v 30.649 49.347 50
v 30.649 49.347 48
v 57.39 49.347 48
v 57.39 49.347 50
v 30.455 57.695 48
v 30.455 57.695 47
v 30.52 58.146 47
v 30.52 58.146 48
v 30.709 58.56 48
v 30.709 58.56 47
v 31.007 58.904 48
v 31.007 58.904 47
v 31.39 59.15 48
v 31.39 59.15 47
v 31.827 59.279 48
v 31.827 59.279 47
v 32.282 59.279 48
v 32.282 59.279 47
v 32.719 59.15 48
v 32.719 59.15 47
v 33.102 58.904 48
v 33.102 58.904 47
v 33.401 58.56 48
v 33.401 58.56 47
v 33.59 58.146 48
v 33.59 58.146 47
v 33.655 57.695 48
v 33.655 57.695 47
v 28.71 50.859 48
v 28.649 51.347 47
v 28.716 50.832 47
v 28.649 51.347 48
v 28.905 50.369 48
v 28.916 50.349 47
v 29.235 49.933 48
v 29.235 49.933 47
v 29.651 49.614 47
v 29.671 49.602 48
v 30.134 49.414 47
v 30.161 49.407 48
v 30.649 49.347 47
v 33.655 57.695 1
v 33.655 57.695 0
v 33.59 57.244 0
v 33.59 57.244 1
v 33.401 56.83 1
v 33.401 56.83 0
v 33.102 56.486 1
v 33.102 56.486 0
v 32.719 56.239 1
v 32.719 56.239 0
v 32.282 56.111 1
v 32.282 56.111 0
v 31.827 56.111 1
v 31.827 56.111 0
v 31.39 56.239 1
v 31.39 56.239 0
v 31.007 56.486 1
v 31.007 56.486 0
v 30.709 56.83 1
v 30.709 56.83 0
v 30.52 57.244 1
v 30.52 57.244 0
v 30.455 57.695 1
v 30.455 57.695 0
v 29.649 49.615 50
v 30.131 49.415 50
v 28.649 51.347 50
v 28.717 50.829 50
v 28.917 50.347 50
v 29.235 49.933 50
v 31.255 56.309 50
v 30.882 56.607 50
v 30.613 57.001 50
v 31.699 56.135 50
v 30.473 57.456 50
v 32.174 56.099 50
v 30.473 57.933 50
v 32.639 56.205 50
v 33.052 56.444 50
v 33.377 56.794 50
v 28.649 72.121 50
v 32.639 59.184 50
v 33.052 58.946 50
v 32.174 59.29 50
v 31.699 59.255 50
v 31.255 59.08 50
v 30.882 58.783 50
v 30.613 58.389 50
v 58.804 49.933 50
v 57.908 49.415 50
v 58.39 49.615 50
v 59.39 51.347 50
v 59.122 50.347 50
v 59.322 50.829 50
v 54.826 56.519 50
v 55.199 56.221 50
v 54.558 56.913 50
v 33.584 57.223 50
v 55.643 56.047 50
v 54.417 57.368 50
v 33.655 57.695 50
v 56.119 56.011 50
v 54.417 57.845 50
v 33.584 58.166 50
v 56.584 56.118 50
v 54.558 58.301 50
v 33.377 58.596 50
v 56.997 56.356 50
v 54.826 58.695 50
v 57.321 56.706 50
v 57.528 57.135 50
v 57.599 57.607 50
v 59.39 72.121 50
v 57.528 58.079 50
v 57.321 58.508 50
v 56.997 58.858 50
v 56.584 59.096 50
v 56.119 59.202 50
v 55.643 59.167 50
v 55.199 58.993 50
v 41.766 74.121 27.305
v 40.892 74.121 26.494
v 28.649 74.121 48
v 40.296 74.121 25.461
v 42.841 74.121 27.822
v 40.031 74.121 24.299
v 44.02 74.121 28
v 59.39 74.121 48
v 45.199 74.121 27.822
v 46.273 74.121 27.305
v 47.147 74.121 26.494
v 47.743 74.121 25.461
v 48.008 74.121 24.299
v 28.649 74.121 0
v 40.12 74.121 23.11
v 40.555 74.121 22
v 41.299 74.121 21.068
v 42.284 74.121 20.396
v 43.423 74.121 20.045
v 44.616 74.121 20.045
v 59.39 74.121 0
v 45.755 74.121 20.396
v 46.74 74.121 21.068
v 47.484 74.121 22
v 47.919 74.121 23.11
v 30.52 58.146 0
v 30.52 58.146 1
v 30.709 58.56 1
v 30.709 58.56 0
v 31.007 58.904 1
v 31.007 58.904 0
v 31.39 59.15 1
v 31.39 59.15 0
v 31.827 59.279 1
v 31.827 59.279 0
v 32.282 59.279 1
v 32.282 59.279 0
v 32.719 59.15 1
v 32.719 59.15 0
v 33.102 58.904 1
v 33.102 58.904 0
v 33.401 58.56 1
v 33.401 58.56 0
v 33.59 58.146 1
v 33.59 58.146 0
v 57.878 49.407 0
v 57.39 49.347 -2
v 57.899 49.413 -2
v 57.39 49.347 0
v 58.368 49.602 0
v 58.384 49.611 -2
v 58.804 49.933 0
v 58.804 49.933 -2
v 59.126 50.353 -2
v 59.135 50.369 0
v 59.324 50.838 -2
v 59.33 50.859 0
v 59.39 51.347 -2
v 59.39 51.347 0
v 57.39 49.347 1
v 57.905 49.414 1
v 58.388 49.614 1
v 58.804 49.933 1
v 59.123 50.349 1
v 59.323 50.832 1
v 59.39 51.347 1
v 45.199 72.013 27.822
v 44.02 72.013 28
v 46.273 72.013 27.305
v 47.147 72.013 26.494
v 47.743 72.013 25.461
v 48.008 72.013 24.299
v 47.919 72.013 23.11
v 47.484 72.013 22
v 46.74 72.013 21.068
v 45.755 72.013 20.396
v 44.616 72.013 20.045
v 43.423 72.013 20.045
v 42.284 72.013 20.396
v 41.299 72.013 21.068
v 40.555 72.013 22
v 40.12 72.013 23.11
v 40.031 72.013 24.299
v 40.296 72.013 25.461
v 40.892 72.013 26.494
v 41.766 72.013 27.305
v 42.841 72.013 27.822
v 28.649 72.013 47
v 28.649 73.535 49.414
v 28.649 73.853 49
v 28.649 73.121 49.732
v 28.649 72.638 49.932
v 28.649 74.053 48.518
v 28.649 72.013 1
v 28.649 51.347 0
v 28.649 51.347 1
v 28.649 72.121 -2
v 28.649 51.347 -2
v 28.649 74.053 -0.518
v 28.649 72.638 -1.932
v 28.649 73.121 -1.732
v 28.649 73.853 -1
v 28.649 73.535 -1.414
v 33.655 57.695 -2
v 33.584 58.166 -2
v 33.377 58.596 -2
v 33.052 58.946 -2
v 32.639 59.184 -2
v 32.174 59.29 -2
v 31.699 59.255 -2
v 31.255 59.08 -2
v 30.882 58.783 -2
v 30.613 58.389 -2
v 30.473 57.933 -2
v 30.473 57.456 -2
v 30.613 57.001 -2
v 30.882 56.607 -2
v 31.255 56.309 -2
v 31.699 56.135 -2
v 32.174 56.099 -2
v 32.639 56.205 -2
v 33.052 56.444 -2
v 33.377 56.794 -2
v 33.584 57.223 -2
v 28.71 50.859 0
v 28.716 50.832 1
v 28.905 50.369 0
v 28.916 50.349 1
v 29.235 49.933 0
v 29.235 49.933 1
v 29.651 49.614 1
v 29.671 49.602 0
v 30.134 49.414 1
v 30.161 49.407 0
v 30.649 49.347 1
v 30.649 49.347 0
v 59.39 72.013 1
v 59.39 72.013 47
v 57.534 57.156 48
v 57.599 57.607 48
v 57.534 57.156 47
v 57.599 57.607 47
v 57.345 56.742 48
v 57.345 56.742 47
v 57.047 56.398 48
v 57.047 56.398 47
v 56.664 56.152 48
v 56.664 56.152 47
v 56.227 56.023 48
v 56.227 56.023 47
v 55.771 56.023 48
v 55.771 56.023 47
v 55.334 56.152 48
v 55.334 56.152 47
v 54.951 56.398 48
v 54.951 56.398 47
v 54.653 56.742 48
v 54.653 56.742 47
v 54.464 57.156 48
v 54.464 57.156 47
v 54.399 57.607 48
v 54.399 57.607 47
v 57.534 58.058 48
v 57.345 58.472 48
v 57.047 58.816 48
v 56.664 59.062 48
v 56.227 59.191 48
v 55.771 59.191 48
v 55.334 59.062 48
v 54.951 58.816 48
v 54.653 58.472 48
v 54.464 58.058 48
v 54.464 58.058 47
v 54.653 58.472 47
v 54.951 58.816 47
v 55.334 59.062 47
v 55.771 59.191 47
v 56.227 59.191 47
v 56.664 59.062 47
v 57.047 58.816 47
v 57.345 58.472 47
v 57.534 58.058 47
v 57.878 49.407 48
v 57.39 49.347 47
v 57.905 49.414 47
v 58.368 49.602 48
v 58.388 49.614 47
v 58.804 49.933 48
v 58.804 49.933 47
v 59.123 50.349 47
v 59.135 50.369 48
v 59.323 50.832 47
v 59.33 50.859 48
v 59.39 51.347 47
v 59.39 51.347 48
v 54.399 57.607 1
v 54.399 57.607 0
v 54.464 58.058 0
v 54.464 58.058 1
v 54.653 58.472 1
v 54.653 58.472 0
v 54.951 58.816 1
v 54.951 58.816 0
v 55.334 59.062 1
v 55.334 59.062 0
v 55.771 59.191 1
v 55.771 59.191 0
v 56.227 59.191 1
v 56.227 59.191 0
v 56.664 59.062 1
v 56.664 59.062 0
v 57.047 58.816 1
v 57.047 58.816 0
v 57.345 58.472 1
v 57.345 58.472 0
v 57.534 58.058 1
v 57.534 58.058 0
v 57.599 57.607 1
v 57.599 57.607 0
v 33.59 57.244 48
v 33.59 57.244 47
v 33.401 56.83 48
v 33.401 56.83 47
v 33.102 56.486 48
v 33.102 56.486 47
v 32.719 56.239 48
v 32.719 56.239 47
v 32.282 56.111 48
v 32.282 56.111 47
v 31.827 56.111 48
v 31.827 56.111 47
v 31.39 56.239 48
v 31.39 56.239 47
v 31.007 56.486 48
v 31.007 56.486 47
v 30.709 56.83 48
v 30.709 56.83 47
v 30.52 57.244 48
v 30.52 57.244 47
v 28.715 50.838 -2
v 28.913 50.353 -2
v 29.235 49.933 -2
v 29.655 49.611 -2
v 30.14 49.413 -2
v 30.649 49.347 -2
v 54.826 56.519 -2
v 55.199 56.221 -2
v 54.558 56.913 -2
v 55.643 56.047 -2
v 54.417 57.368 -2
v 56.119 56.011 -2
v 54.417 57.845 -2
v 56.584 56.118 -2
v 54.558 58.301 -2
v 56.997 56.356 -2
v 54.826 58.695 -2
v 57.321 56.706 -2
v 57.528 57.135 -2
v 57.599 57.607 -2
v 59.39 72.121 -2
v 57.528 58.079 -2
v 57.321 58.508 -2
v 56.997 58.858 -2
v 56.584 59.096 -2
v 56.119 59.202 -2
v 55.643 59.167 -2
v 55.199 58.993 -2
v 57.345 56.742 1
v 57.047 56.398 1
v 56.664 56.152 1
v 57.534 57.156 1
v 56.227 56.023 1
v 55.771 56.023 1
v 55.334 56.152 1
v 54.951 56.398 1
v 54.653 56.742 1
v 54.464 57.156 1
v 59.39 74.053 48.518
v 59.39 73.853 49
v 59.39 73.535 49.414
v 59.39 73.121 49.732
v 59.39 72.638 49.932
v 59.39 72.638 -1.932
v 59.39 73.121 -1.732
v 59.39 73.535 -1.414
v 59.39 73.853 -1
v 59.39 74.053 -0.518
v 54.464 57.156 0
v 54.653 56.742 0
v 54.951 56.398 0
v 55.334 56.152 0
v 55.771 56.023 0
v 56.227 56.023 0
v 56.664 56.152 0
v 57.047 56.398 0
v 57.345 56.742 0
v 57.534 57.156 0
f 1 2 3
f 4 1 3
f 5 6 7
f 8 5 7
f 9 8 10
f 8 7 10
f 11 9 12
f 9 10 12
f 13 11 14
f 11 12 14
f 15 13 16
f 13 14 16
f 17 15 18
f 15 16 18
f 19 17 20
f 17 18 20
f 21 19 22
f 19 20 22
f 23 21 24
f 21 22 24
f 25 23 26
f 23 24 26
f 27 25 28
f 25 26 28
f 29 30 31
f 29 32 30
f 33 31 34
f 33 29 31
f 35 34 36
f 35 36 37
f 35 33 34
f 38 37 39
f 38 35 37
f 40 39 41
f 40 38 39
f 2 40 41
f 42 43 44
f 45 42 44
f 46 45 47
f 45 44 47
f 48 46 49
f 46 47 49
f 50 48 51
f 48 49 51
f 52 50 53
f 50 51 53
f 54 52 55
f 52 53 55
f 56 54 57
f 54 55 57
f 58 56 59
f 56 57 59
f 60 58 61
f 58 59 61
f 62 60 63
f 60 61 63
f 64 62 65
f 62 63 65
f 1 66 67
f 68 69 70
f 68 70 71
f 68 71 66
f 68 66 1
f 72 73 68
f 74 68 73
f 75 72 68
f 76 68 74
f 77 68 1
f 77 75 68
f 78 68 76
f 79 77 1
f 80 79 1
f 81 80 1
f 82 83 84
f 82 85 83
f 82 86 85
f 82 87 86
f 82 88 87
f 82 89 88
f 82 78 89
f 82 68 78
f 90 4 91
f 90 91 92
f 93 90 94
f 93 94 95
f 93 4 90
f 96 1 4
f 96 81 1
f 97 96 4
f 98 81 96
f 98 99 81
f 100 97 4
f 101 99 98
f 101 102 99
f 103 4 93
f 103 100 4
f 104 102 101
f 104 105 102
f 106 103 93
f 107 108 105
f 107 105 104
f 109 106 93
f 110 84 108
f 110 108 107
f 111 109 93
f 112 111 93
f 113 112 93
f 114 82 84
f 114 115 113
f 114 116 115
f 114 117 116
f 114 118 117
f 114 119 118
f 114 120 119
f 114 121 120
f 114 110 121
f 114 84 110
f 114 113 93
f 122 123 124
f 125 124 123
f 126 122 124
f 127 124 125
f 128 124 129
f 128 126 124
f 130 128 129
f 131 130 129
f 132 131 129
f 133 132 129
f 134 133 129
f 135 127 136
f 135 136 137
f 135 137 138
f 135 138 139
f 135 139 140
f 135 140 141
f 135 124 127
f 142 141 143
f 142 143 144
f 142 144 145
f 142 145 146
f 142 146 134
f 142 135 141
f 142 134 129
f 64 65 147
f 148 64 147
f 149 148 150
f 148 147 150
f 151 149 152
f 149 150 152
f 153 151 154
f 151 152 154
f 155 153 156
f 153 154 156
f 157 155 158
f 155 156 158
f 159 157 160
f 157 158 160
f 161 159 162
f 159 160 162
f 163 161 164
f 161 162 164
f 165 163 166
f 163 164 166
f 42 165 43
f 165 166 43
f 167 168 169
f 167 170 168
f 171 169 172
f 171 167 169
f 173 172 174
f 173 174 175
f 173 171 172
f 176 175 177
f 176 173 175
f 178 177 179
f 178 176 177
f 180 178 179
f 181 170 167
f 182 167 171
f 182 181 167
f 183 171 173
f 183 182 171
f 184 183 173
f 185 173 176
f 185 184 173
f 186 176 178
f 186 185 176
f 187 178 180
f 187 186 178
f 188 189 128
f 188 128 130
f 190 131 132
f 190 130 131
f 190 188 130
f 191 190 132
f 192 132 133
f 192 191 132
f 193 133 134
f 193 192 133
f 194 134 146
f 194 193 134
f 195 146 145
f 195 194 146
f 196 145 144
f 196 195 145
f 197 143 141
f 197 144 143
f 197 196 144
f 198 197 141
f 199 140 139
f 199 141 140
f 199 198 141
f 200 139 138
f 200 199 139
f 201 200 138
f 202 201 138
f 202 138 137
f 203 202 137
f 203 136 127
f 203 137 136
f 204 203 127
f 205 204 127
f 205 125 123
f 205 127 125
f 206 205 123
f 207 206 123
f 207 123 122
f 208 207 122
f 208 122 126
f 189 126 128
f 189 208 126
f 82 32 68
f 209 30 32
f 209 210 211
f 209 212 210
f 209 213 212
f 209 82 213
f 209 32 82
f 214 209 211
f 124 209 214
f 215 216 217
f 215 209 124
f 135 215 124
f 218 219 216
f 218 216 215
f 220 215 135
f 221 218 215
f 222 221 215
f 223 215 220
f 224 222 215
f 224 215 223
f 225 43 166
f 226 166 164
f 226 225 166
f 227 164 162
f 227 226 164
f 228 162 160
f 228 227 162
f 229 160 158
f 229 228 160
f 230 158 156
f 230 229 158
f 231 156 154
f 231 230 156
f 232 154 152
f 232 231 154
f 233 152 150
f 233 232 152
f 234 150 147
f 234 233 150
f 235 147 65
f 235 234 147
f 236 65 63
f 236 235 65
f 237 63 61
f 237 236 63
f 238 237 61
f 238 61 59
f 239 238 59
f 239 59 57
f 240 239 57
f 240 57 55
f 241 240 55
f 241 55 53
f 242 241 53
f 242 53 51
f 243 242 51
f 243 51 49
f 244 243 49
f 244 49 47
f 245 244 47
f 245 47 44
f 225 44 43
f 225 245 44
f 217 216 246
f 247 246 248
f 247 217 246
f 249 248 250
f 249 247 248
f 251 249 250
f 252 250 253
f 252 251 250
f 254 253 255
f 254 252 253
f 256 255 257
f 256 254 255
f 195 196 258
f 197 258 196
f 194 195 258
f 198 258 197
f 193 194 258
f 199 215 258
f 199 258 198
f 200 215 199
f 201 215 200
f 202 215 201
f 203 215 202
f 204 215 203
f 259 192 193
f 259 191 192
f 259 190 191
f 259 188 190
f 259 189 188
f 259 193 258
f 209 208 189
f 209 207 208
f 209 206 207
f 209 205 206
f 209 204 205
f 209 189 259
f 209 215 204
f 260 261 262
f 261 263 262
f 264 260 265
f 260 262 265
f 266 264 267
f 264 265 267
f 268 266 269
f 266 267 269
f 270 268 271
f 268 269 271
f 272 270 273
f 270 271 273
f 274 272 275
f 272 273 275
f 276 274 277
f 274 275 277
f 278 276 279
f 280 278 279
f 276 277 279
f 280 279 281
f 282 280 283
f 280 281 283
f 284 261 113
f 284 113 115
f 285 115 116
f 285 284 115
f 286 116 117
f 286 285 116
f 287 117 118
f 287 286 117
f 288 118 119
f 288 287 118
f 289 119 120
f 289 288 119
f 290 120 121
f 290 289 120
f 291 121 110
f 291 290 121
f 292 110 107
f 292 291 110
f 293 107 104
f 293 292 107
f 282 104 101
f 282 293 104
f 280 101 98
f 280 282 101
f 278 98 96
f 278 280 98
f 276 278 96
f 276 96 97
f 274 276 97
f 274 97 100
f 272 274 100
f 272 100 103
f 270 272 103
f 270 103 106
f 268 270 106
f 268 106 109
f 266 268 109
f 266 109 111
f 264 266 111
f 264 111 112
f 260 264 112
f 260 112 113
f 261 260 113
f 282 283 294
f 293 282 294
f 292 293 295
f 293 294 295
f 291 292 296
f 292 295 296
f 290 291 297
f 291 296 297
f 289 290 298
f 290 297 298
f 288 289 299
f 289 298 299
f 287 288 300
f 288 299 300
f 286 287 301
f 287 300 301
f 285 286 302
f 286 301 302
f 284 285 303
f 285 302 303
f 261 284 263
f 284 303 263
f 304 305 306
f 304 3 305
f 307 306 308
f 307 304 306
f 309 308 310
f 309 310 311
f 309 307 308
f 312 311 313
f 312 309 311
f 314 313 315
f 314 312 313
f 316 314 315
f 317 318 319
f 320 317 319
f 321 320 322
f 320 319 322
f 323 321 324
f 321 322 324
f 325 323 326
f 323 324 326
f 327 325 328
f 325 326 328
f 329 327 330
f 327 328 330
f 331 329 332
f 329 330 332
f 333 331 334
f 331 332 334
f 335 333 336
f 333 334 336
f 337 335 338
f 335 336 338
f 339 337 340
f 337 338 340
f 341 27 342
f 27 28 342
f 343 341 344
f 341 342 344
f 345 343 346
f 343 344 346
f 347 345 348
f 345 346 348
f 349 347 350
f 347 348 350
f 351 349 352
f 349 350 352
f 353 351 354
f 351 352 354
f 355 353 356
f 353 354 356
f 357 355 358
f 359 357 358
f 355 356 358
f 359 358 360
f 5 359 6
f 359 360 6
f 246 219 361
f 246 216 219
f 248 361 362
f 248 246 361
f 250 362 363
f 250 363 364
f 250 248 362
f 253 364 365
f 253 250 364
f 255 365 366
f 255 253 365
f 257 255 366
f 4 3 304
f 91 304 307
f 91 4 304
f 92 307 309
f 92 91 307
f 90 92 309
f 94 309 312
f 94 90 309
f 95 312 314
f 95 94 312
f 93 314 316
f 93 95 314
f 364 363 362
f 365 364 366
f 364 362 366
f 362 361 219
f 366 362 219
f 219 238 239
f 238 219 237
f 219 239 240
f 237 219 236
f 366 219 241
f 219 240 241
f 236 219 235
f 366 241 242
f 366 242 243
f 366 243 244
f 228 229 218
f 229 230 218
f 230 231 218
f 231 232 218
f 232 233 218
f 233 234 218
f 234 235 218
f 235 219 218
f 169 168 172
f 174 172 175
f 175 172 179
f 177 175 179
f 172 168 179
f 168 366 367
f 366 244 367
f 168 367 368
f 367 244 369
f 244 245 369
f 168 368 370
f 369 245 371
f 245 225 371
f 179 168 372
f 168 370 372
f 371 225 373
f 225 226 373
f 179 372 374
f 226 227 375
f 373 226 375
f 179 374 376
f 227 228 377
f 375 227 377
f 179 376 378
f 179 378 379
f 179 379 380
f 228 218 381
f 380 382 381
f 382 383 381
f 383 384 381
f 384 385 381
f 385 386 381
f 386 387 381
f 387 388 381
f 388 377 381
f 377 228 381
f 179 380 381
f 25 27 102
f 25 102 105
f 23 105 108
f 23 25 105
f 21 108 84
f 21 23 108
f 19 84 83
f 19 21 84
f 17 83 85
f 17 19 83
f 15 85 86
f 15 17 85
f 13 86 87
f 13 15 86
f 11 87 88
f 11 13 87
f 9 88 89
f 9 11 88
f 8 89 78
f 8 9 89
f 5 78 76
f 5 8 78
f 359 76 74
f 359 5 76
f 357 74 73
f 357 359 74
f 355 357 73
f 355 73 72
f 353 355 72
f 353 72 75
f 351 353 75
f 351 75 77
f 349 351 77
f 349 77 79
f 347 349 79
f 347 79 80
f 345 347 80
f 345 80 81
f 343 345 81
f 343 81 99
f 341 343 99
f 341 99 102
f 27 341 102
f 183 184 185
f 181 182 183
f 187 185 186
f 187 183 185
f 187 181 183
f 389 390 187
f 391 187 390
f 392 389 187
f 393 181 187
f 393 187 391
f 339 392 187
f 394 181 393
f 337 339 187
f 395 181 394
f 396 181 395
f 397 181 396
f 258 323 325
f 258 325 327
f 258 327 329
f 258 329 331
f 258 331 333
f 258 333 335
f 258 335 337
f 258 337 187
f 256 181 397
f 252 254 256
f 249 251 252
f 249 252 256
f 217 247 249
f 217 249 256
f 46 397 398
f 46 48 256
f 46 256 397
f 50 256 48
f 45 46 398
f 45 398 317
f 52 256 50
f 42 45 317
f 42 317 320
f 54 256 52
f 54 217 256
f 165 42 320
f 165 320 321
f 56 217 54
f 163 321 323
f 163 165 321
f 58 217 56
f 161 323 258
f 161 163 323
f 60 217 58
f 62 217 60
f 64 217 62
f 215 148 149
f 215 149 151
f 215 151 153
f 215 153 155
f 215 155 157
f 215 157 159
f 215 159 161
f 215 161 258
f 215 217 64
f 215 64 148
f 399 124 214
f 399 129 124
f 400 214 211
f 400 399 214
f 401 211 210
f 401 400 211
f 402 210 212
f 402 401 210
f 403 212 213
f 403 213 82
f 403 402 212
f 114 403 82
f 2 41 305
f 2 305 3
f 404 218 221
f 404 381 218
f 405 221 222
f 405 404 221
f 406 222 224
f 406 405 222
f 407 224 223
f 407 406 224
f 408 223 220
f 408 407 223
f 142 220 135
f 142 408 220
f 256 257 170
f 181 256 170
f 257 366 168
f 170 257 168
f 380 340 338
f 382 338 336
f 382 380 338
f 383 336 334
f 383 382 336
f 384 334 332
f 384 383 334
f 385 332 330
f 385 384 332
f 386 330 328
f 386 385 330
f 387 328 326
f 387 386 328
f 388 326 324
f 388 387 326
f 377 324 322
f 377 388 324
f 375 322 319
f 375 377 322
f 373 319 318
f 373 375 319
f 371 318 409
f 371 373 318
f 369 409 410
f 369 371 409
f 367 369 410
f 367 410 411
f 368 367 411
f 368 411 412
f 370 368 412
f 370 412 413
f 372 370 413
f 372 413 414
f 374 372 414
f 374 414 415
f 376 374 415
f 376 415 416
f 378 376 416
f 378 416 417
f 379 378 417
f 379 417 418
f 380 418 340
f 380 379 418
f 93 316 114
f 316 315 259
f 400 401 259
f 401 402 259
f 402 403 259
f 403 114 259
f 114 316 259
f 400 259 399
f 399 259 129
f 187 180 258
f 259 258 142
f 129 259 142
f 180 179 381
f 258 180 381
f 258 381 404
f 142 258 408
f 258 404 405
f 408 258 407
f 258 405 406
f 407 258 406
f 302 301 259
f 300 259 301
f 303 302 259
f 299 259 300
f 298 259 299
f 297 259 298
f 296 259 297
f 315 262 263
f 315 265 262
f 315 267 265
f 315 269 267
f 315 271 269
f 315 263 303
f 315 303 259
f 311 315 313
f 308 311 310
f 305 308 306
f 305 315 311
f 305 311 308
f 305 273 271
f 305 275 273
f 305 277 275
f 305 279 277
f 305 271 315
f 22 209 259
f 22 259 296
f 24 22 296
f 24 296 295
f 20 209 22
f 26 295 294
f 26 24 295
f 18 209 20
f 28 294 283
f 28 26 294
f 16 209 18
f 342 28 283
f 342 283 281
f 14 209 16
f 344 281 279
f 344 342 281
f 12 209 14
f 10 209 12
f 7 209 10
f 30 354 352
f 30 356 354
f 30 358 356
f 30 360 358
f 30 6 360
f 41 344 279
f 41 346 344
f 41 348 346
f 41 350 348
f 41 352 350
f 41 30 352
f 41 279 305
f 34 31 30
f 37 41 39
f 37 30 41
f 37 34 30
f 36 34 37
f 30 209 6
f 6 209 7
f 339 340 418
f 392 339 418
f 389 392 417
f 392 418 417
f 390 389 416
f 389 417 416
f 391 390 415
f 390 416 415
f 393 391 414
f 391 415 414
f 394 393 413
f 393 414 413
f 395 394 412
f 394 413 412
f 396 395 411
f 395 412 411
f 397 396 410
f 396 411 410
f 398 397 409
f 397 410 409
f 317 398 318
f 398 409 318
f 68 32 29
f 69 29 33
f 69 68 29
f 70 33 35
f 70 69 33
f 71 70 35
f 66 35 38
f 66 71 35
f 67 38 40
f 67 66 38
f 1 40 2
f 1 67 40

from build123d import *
from build123d.topology import SkipClean

# Parameters (mm, degrees)
SKETCH_1_W               = 30
SKETCH_1_H               = 65
EXTRUDE_1_DEPTH          = 48
SKETCH_2_R               = 1
CUT_EXTRUDE_1_DEPTH      = 48
EXTRUDE_2_DEPTH          = 5
EXTRUDE_2_DEPTH_BACK     = 53
SKETCH_3_R               = 3
CHAMFER_1_SIZE           = 2
FILLET_1_R               = 1
FILLET_2_R               = 1
SKETCH_6_R               = 1.6
CUT_EXTRUDE_3_DEPTH      = 76
EXTRUDE_3_DEPTH          = 50
EXTRUDE_3_DEPTH_BACK     = 2
SKETCH_7_W               = 30.741029275
SKETCH_7_H               = 24.773895079
SKETCH_7_R               = 1.6
CUT_EXTRUDE_START        = -30.741029275
CUT_EXTRUDE_4_DEPTH      = 30.741029275
CUT_EXTRUDE_5_DEPTH      = 50
CUT_EXTRUDE_5_DEPTH_BACK = 50
SKETCH_9_R               = 4
FILLET_3_R               = 2


# Read off the part's stored shape, not the designer's step: ｶｯﾄ - 押し出し4
with BuildPart() as part:
    # ｽｹｯﾁ1 → ﾎﾞｽ - 押し出し1 (new body)
    with BuildSketch(Plane.XY):
        with Locations((44.026916893, 39.150883092)):
            Rectangle(SKETCH_1_W, SKETCH_1_H)
    extrude(amount=EXTRUDE_1_DEPTH)

    # ｽｹｯﾁ2 → ｶｯﾄ - 押し出し1 (cut)
    with BuildSketch(Plane.XY):
        with Locations((56.026916893, 57.650883092)):
            Circle(SKETCH_2_R)
        with Locations((44.026916893, 57.650883092)):
            Circle(SKETCH_2_R)
        with Locations((56.023819064, 45.923533591)):
            Circle(SKETCH_2_R)
        with Locations((32.026916893, 57.650883092)):
            Circle(SKETCH_2_R)
        with Locations(Location((32.030014722, 45.923533591, 0), (0, 0, 180))):
            Circle(SKETCH_2_R)
    extrude(amount=CUT_EXTRUDE_1_DEPTH, mode=Mode.SUBTRACT)

    # ｽｹｯﾁ3 → ﾎﾞｽ - 押し出し2 (add, two sides: drawn at the far end of the back side and taken through both)
    with BuildSketch(Plane(origin=(0, 0, 0), x_dir=(-1, 0, 0), z_dir=(0, 0, -1)).offset(-EXTRUDE_2_DEPTH_BACK)):
        with Locations((-44.026916893, 18.650883092)):
            Circle(SKETCH_3_R)
    extrude(amount=EXTRUDE_2_DEPTH + EXTRUDE_2_DEPTH_BACK)

    # 面取り1
    chamfer_1_edges = [part.edges().sort_by_distance(p)[0] for p in [
        (29.026916893, 71.650883092, 24),
        (59.026916893, 71.650883092, 24),
        (59.026916893, 6.650883092, 24),
        (29.026916893, 6.650883092, 24),
    ]]
    chamfer(chamfer_1_edges, length=CHAMFER_1_SIZE)

    # ﾌｨﾚｯﾄ1
    fillet_1_edges = [part.edges().sort_by_distance(p)[0] for p in [
        (44.026916893, 6.650883092, 48),
        (29.026916893, 39.150883092, 48),
        (59.026916893, 39.150883092, 48),
        (44.026916893, 71.650883092, 48),
        (30.026916893, 70.650883092, 48),
        (58.026916893, 70.650883092, 48),
        (58.026916893, 7.650883092, 48),
        (30.026916893, 7.650883092, 48),
    ]]
    fillet(fillet_1_edges, radius=FILLET_1_R)

    # ﾌｨﾚｯﾄ2
    fillet_2_edges = [part.edges().sort_by_distance(p)[0] for p in [
        (44.026916893, 6.650883092, 0),
        (29.026916893, 39.150883092, 0),
        (44.026916893, 71.650883092, 0),
        (59.026916893, 39.150883092, 0),
        (30.026916893, 70.650883092, 0),
        (58.026916893, 70.650883092, 0),
        (58.026916893, 7.650883092, 0),
        (30.026916893, 7.650883092, 0),
    ]]
    fillet(fillet_2_edges, radius=FILLET_2_R)

    # ｽｹｯﾁ6 → ｶｯﾄ - 押し出し3 (cut)
    with BuildSketch(Plane(origin=(0, 0, 0), x_dir=(-1, 0, 0), z_dir=(0, 0, -1))):
        with Locations((-55.99912174, 57.606952707)):
            Circle(SKETCH_6_R)
        with Locations((-32.054712046, 57.694813478)):
            Circle(SKETCH_6_R)
        with Locations((-55.99912174, 45.879603206)):
            Circle(SKETCH_6_R)
        with Locations((-32.054712046, 45.967463976)):
            Circle(SKETCH_6_R)
    extrude(amount=-CUT_EXTRUDE_3_DEPTH, mode=Mode.SUBTRACT)

    # ｽｹｯﾁ7 → ﾎﾞｽ - 押し出し3 (add, two sides: drawn at the far end of the back side and taken through both)
    with SkipClean():  # the faces are left unmerged after this step: merging them gives an invalid solid
        with BuildSketch(Plane.XY.offset(-EXTRUDE_3_DEPTH_BACK)):
            with Locations((44.019576577, 61.733784516)):
                Rectangle(SKETCH_7_W, SKETCH_7_H)
            with Locations((32.054712046, 57.694813478)):
                Circle(SKETCH_7_R, mode=Mode.SUBTRACT)
            with Locations((55.99912174, 57.606952707)):
                Circle(SKETCH_7_R, mode=Mode.SUBTRACT)
        extrude(amount=EXTRUDE_3_DEPTH + EXTRUDE_3_DEPTH_BACK)

    # ｶｯﾄ - 押し出し4 outline → ｶｯﾄ - 押し出し4 (cut)
    with SkipClean():  # the faces are left unmerged after this step: merging them gives an invalid solid
        with BuildSketch(Plane(origin=(59.390091214, 0, 0), x_dir=(0, 0, -1), z_dir=(1, 0, 0)).offset(CUT_EXTRUDE_START)):
            Polygon((-1, 49.346836976), (-1, 72.013202711), (-47, 72.013202711), (-47, 49.346836976), (-48, 49.346836976), (-48, 45.206300999), (-57.188140565, 45.206300999), (-57.188140565, 1.456905632), (13.746291121, 1.456905632), (13.746291121, 49.346836976), align=None)
        extrude(amount=CUT_EXTRUDE_4_DEPTH, mode=Mode.SUBTRACT)

    # ｽｹｯﾁ9 → ｶｯﾄ - 押し出し5 (cut, two sides: drawn at the far end of the back side and taken through both)
    with SkipClean():  # the faces are left unmerged after this step: merging them gives an invalid solid
        with BuildSketch(Plane(origin=(0, 74.120732055, 0), x_dir=(1, 0, 0), z_dir=(0, 1, 0)).offset(-CUT_EXTRUDE_5_DEPTH_BACK)):
            with Locations(Location((44.019576577, -24, 0), (0, 0, 270))):
                Circle(SKETCH_9_R)
        extrude(amount=CUT_EXTRUDE_5_DEPTH + CUT_EXTRUDE_5_DEPTH_BACK, mode=Mode.SUBTRACT)

    # ﾌｨﾚｯﾄ3
    fillet_3_edges = [part.edges().sort_by_distance(p)[0] for p in [
        (28.649061939, 49.346836976, -0.5),
        (44.019576577, 74.120732055, -2),
        (59.390091214, 49.346836976, -0.5),
        (44.019576577, 74.120732055, 50),
        (59.390091214, 49.346836976, 49),
        (28.649061939, 49.346836976, 49),
    ]]
    fillet(fillet_3_edges, radius=FILLET_3_R)


solid = part.part
